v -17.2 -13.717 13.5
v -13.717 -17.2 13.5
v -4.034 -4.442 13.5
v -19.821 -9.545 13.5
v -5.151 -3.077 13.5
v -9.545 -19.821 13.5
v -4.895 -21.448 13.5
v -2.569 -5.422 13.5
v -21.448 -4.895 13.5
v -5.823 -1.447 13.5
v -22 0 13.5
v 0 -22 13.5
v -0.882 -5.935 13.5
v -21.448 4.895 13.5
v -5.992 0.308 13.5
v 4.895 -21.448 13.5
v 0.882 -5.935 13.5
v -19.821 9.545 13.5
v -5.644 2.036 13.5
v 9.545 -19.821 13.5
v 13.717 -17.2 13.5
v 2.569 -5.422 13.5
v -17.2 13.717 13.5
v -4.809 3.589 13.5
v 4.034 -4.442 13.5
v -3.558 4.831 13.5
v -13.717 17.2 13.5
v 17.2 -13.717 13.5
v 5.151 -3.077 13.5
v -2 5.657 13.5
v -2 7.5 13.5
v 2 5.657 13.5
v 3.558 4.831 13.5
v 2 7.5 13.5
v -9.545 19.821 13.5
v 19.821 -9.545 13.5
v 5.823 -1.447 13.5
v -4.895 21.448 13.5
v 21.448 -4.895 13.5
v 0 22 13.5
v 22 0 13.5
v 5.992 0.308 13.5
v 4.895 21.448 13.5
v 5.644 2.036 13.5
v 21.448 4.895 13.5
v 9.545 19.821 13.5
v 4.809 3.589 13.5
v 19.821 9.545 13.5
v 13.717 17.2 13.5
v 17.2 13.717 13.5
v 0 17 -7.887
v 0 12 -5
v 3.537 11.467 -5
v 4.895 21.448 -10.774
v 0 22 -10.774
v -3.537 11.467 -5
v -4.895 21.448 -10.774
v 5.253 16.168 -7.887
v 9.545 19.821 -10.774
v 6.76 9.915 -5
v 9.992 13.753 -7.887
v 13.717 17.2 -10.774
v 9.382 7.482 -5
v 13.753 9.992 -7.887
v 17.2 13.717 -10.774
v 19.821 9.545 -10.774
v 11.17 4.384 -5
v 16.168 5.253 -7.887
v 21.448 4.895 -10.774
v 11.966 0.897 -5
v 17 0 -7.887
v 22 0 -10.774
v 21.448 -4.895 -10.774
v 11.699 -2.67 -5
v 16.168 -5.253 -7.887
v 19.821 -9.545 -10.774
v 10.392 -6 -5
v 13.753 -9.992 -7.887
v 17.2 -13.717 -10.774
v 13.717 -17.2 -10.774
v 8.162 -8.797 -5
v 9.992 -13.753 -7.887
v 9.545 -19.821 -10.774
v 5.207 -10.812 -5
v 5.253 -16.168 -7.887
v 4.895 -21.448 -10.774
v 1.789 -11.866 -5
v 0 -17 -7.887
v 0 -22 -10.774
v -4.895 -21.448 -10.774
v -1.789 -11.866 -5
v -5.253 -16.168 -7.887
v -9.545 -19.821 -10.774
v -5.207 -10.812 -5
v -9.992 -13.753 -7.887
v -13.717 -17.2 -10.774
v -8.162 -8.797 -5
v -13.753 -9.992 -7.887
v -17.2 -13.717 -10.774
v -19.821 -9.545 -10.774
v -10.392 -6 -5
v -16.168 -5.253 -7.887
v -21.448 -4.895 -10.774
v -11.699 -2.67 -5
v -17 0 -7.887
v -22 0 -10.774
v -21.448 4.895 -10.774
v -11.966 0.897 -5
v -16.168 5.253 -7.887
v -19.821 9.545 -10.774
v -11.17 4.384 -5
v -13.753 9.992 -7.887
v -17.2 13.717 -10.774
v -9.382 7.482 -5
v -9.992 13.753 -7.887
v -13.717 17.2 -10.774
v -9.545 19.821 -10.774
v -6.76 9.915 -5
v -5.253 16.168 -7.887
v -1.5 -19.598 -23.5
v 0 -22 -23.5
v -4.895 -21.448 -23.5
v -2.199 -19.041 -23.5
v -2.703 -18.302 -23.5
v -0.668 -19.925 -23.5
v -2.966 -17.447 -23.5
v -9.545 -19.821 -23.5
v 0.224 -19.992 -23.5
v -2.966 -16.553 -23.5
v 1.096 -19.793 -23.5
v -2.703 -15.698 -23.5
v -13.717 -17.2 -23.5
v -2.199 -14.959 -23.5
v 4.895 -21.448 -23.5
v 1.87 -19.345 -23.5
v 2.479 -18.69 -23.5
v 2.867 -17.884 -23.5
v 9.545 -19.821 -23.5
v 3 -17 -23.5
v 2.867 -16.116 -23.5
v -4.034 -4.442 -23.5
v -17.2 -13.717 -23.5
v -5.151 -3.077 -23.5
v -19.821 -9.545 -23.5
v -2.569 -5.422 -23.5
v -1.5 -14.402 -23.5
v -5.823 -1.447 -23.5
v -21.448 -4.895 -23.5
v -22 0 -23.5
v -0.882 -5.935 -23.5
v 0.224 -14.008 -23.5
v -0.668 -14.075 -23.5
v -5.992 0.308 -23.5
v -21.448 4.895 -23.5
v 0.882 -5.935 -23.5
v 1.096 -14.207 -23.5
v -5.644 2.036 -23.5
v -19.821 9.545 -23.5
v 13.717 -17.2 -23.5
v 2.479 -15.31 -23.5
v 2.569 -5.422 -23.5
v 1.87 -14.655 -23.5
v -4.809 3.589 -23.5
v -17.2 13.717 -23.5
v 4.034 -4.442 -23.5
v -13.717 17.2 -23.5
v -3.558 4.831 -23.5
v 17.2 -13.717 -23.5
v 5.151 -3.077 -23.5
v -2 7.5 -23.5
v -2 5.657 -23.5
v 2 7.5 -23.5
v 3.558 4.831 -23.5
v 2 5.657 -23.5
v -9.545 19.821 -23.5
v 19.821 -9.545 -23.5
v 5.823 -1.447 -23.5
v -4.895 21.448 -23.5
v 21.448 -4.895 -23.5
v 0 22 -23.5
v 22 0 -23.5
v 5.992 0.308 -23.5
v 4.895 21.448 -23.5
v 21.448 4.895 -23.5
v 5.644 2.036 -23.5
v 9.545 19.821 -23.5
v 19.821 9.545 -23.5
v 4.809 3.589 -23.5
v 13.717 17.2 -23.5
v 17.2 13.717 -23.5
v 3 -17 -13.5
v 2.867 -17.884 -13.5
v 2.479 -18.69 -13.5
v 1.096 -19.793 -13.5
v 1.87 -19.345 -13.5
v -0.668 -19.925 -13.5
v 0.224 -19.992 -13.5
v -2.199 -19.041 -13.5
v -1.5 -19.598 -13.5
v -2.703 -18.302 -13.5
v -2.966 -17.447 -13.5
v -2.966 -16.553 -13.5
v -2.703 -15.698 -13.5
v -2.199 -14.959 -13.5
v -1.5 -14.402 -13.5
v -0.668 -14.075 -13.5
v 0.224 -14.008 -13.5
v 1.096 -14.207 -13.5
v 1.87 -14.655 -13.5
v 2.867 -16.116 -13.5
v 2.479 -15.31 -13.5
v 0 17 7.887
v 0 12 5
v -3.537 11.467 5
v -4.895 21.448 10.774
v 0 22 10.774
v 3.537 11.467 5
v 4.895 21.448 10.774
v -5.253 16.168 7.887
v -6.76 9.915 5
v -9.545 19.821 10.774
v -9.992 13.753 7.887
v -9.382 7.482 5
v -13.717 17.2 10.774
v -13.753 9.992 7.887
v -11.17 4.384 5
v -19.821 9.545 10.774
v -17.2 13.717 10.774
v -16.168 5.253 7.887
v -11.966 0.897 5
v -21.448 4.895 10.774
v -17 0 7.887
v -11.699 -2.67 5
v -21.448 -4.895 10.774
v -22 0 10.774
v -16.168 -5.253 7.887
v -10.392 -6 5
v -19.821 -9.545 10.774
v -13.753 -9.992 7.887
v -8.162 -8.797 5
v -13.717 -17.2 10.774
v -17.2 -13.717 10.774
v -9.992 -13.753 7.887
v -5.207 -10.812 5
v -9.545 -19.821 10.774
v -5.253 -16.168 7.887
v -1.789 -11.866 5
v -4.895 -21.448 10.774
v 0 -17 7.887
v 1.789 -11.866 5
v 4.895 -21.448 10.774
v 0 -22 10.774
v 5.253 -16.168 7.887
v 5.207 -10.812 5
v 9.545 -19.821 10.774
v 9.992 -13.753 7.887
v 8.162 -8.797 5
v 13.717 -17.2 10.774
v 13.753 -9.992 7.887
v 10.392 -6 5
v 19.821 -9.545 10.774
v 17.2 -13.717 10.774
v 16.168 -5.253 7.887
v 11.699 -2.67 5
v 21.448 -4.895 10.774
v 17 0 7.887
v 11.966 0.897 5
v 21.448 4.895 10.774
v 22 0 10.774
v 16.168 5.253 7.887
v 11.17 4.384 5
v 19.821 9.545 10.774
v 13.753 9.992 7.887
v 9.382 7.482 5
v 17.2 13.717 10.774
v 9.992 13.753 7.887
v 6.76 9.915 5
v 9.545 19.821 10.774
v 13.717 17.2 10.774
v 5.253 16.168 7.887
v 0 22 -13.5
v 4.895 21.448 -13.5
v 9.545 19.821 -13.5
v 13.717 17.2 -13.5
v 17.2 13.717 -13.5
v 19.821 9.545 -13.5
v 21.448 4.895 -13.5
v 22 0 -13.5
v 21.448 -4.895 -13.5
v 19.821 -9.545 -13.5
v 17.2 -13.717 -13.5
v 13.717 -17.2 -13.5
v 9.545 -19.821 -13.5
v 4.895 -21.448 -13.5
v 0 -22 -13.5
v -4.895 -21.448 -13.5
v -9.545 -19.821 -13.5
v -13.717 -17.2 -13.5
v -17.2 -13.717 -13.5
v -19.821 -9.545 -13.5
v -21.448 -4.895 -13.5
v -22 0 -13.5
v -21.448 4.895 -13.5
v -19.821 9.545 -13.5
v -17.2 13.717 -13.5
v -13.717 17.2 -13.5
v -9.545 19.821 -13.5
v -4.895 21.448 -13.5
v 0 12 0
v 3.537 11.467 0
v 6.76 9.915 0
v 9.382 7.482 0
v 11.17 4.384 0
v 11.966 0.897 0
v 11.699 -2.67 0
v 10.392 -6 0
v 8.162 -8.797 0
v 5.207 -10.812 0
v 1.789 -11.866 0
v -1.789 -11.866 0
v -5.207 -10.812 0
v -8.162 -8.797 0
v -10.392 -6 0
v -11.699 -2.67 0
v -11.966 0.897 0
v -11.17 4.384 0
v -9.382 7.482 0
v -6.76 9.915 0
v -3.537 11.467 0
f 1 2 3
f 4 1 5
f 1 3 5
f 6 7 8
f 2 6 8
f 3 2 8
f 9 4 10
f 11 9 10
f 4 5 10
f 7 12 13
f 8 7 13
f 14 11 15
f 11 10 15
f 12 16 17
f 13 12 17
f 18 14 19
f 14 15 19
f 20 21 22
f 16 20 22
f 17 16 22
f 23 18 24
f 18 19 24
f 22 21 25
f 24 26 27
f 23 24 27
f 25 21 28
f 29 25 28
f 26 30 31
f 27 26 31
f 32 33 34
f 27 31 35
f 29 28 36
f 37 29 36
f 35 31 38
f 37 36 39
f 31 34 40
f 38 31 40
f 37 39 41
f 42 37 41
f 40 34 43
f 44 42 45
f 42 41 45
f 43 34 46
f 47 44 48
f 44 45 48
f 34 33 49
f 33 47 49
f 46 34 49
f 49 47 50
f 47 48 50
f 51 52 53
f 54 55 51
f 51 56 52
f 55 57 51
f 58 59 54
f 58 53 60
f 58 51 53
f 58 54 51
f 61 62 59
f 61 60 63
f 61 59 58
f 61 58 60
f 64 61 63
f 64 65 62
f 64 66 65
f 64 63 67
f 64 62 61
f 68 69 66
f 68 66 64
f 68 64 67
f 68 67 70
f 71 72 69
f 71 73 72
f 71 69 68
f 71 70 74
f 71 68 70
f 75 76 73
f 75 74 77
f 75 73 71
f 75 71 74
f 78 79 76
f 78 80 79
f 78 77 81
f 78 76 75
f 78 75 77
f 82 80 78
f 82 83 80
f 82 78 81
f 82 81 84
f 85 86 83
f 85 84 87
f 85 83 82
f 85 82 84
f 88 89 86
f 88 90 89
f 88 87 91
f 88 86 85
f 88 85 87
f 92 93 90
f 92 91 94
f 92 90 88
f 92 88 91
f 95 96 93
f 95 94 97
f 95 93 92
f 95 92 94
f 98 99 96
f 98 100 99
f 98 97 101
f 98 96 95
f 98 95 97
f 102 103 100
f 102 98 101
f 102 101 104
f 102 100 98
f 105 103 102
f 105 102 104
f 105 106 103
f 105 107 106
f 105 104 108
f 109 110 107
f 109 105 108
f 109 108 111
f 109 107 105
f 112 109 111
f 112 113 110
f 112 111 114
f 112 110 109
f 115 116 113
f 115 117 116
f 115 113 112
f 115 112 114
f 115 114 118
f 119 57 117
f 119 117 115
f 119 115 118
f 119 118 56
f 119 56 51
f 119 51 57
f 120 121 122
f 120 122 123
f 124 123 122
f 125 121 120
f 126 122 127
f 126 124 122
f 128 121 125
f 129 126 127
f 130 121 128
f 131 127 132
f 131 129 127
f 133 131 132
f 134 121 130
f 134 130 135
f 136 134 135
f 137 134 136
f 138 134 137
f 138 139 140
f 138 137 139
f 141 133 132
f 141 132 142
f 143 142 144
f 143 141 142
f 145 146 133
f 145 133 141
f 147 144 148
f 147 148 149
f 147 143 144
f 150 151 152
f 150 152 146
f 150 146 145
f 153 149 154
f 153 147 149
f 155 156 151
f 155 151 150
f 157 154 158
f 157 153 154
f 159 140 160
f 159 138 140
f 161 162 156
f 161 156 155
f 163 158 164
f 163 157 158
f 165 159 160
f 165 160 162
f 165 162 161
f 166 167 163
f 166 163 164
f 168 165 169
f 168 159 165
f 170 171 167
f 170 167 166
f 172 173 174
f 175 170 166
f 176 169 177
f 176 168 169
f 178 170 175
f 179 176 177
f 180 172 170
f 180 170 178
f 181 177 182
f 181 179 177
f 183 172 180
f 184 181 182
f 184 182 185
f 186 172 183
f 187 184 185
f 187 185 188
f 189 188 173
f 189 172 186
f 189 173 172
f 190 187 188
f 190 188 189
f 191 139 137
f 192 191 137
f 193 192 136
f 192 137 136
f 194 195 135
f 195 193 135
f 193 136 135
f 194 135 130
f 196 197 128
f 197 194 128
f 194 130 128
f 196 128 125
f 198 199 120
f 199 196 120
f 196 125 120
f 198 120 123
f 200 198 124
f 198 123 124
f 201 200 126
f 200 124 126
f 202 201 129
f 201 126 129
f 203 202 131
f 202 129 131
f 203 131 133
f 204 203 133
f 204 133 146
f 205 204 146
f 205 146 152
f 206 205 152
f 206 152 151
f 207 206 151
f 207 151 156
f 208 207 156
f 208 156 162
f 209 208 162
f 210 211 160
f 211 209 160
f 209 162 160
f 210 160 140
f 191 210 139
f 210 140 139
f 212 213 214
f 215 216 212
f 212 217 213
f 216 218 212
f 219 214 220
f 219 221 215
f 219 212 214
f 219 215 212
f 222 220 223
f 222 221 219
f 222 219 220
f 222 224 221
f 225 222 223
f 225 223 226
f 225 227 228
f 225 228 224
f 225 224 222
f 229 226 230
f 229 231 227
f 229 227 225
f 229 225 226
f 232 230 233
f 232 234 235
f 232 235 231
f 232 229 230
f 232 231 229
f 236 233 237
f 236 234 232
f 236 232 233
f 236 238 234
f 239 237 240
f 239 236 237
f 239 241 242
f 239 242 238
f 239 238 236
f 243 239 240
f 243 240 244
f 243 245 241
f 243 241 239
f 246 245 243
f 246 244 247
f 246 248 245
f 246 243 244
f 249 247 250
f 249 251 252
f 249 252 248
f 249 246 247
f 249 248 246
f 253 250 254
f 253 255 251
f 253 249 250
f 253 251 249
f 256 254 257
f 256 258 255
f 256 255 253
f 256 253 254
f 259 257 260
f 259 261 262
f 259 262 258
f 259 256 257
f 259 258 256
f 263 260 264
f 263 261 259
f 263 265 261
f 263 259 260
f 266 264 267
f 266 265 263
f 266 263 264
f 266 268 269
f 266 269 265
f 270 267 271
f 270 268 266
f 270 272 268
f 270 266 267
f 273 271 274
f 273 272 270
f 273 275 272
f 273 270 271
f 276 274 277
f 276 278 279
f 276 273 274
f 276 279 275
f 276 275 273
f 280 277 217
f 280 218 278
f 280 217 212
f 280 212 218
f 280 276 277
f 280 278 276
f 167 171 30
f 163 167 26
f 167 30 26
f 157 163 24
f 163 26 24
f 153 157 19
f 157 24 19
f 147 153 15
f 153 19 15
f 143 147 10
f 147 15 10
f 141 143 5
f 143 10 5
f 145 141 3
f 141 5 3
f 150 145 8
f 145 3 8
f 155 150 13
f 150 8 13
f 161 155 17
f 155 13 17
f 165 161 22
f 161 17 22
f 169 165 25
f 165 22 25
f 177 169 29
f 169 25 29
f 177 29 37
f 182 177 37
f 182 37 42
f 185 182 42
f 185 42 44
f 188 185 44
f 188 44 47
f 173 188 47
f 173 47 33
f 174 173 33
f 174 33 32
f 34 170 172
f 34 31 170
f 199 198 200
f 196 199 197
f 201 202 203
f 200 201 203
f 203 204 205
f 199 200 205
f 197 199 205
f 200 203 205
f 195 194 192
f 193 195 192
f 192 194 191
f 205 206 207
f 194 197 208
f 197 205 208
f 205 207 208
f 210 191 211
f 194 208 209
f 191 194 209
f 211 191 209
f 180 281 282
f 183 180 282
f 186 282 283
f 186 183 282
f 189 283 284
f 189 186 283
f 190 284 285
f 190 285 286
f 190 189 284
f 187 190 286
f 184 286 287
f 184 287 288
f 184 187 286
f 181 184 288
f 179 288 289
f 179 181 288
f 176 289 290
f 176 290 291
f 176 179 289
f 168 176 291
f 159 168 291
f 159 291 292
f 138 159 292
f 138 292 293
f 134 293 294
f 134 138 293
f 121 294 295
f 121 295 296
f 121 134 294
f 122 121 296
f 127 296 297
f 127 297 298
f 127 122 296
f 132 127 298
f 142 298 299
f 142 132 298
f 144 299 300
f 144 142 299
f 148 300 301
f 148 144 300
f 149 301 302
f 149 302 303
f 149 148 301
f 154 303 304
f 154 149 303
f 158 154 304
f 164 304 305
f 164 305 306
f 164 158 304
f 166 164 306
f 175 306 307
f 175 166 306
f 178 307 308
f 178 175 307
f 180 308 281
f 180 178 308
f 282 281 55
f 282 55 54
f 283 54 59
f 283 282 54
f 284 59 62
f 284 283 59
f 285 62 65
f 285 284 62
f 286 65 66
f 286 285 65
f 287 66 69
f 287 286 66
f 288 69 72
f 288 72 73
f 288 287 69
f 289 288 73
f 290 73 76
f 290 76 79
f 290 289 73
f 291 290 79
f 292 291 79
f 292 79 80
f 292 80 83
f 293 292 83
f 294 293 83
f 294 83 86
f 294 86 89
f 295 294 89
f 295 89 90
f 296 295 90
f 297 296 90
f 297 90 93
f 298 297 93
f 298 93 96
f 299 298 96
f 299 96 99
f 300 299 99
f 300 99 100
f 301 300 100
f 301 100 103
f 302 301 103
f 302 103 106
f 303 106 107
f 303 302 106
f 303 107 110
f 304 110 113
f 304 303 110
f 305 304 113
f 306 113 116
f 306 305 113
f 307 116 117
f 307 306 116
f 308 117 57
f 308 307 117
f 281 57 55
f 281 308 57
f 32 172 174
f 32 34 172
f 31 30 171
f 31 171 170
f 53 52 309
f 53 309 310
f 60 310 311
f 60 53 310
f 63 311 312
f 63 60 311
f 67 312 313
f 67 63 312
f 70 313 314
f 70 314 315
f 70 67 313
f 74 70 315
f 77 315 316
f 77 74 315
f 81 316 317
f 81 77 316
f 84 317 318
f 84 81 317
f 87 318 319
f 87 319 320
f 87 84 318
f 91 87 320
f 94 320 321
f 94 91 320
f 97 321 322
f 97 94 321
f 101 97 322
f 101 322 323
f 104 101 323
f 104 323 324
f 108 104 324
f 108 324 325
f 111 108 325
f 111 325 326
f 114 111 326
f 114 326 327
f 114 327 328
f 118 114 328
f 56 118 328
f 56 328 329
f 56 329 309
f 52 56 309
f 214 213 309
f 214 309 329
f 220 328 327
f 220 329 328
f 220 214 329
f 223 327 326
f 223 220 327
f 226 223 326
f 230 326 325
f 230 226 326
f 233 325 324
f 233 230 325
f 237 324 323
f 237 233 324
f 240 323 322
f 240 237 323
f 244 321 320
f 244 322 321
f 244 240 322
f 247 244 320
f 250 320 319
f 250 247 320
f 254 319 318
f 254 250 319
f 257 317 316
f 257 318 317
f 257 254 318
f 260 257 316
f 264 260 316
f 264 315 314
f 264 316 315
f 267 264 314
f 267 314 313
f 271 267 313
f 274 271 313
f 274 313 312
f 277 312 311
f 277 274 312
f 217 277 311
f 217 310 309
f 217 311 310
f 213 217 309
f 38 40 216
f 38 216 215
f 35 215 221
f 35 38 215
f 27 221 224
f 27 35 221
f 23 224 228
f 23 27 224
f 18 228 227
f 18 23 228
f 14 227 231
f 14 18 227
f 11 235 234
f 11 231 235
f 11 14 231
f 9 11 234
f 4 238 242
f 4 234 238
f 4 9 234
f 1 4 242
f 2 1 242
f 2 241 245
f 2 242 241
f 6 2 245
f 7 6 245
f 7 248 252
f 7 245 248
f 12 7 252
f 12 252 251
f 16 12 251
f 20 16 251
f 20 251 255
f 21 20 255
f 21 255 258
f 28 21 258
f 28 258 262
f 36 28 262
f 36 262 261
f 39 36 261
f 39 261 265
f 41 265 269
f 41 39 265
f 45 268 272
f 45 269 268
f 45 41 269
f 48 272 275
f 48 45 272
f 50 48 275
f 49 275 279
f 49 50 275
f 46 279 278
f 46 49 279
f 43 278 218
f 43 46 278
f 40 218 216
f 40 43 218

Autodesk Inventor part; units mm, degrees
ref_plane "YZ Plane" through (0, 0, 0) normal (1, 0, 0) x (0, 1, 0)
ref_plane "XZ Plane" through (0, 0, 0) normal (0, 1, 0) x (-1, 0, 0)
ref_plane "XY Plane" through (0, 0, 0) normal (0, 0, 1) x (1, 0, 0)
sketch "Sketch2" plane through (0, 0, 0) normal (1, 0, 0) x (0, 1, 0)
  line L0 (0, 0) -> (12, 0) construction
  line L1 (12, 0) -> (12, -5)
  line L2 (12, -5) -> (22, -10.7735)
  line L3 (22, -10.7735) -> (22, -13.5)
  line L4 (22, -13.5) -> (0, -13.5)
  line L5 (0, -13.5) -> (0, 0)
  line L6 (12, 0) -> (12, 5)
  line L7 (12, 5) -> (22, 10.7735)
  line L8 (22, 10.7735) -> (22, 13.5)
  line L9 (22, 13.5) -> (0, 13.5)
  line L10 (0, 13.5) -> (0, 0)
  line L11 (0, 0) -> (0, -46.5785) construction
  line L12 (22, -13.5) -> (22, -23.5)
  line L13 (22, -23.5) -> (0, -23.5)
  line L14 (0, -13.5) -> (0, -23.5)
  dimension "d0" = 22
  dimension "d1" = 13.5
  dimension "d2" = 5
  dimension "d3" = 60
  dimension "d4" = 10
  dimension "d16" = 10
revolve "Revolution1" add sketch "Sketch2" angle 360 about axis through (0, 0, 0) along (0, 0, -1)
sketch "Sketch3" plane through (0, 0, 13.5) normal (0, 0, 1) x (1, 0, 0)
  circle A0 centre (0, 0) radius 6
  line L0 (-2, 7.5) -> (2, 7.5)
  line L1 (2, 7.5) -> (2, 1.4561)
  line L2 (2, 1.4561) -> (-2, 1.4561)
  line L3 (-2, 1.4561) -> (-2, 7.5)
  line L4 (-2, 7.5) -> (2, 1.4561) construction
  line L5 (2, 7.5) -> (-2, 1.4561) construction
  line L6 (-5.2122, 6) -> (6.1572, 6) construction
  point P0 (0, 4.4781)
  point P1 (-2, 5.6569)
  point P2 (2, 5.6569)
  dimension "d6" = 12
  dimension "d7" = 4
  dimension "d9" = 1.5
extrude "Extrusion1" cut sketch "Sketch3" against normal through all
sketch "Sketch4" plane through (0, 0, -23.5) normal (0, 0, 1) x (1, 0, 0)
  circle A0 centre (0, -17) radius 3
  arc A1 (-2, 5.6569) -> (2, 5.6569) centre (0, 0) ccw construction
  line L0 (0, 0) -> (0, -6) construction
  line L1 (0, -6) -> (0, -17) construction
  line L2 (0, -17) -> (0, -25) construction
  circle A2 centre (0, 0) radius 25 construction
  dimension "d12" = 6
  dimension "d17" = 8
extrude "Extrusion2" cut sketch "Sketch4" along normal blind 10
properties part number "Vbelt Slave Pulley"
